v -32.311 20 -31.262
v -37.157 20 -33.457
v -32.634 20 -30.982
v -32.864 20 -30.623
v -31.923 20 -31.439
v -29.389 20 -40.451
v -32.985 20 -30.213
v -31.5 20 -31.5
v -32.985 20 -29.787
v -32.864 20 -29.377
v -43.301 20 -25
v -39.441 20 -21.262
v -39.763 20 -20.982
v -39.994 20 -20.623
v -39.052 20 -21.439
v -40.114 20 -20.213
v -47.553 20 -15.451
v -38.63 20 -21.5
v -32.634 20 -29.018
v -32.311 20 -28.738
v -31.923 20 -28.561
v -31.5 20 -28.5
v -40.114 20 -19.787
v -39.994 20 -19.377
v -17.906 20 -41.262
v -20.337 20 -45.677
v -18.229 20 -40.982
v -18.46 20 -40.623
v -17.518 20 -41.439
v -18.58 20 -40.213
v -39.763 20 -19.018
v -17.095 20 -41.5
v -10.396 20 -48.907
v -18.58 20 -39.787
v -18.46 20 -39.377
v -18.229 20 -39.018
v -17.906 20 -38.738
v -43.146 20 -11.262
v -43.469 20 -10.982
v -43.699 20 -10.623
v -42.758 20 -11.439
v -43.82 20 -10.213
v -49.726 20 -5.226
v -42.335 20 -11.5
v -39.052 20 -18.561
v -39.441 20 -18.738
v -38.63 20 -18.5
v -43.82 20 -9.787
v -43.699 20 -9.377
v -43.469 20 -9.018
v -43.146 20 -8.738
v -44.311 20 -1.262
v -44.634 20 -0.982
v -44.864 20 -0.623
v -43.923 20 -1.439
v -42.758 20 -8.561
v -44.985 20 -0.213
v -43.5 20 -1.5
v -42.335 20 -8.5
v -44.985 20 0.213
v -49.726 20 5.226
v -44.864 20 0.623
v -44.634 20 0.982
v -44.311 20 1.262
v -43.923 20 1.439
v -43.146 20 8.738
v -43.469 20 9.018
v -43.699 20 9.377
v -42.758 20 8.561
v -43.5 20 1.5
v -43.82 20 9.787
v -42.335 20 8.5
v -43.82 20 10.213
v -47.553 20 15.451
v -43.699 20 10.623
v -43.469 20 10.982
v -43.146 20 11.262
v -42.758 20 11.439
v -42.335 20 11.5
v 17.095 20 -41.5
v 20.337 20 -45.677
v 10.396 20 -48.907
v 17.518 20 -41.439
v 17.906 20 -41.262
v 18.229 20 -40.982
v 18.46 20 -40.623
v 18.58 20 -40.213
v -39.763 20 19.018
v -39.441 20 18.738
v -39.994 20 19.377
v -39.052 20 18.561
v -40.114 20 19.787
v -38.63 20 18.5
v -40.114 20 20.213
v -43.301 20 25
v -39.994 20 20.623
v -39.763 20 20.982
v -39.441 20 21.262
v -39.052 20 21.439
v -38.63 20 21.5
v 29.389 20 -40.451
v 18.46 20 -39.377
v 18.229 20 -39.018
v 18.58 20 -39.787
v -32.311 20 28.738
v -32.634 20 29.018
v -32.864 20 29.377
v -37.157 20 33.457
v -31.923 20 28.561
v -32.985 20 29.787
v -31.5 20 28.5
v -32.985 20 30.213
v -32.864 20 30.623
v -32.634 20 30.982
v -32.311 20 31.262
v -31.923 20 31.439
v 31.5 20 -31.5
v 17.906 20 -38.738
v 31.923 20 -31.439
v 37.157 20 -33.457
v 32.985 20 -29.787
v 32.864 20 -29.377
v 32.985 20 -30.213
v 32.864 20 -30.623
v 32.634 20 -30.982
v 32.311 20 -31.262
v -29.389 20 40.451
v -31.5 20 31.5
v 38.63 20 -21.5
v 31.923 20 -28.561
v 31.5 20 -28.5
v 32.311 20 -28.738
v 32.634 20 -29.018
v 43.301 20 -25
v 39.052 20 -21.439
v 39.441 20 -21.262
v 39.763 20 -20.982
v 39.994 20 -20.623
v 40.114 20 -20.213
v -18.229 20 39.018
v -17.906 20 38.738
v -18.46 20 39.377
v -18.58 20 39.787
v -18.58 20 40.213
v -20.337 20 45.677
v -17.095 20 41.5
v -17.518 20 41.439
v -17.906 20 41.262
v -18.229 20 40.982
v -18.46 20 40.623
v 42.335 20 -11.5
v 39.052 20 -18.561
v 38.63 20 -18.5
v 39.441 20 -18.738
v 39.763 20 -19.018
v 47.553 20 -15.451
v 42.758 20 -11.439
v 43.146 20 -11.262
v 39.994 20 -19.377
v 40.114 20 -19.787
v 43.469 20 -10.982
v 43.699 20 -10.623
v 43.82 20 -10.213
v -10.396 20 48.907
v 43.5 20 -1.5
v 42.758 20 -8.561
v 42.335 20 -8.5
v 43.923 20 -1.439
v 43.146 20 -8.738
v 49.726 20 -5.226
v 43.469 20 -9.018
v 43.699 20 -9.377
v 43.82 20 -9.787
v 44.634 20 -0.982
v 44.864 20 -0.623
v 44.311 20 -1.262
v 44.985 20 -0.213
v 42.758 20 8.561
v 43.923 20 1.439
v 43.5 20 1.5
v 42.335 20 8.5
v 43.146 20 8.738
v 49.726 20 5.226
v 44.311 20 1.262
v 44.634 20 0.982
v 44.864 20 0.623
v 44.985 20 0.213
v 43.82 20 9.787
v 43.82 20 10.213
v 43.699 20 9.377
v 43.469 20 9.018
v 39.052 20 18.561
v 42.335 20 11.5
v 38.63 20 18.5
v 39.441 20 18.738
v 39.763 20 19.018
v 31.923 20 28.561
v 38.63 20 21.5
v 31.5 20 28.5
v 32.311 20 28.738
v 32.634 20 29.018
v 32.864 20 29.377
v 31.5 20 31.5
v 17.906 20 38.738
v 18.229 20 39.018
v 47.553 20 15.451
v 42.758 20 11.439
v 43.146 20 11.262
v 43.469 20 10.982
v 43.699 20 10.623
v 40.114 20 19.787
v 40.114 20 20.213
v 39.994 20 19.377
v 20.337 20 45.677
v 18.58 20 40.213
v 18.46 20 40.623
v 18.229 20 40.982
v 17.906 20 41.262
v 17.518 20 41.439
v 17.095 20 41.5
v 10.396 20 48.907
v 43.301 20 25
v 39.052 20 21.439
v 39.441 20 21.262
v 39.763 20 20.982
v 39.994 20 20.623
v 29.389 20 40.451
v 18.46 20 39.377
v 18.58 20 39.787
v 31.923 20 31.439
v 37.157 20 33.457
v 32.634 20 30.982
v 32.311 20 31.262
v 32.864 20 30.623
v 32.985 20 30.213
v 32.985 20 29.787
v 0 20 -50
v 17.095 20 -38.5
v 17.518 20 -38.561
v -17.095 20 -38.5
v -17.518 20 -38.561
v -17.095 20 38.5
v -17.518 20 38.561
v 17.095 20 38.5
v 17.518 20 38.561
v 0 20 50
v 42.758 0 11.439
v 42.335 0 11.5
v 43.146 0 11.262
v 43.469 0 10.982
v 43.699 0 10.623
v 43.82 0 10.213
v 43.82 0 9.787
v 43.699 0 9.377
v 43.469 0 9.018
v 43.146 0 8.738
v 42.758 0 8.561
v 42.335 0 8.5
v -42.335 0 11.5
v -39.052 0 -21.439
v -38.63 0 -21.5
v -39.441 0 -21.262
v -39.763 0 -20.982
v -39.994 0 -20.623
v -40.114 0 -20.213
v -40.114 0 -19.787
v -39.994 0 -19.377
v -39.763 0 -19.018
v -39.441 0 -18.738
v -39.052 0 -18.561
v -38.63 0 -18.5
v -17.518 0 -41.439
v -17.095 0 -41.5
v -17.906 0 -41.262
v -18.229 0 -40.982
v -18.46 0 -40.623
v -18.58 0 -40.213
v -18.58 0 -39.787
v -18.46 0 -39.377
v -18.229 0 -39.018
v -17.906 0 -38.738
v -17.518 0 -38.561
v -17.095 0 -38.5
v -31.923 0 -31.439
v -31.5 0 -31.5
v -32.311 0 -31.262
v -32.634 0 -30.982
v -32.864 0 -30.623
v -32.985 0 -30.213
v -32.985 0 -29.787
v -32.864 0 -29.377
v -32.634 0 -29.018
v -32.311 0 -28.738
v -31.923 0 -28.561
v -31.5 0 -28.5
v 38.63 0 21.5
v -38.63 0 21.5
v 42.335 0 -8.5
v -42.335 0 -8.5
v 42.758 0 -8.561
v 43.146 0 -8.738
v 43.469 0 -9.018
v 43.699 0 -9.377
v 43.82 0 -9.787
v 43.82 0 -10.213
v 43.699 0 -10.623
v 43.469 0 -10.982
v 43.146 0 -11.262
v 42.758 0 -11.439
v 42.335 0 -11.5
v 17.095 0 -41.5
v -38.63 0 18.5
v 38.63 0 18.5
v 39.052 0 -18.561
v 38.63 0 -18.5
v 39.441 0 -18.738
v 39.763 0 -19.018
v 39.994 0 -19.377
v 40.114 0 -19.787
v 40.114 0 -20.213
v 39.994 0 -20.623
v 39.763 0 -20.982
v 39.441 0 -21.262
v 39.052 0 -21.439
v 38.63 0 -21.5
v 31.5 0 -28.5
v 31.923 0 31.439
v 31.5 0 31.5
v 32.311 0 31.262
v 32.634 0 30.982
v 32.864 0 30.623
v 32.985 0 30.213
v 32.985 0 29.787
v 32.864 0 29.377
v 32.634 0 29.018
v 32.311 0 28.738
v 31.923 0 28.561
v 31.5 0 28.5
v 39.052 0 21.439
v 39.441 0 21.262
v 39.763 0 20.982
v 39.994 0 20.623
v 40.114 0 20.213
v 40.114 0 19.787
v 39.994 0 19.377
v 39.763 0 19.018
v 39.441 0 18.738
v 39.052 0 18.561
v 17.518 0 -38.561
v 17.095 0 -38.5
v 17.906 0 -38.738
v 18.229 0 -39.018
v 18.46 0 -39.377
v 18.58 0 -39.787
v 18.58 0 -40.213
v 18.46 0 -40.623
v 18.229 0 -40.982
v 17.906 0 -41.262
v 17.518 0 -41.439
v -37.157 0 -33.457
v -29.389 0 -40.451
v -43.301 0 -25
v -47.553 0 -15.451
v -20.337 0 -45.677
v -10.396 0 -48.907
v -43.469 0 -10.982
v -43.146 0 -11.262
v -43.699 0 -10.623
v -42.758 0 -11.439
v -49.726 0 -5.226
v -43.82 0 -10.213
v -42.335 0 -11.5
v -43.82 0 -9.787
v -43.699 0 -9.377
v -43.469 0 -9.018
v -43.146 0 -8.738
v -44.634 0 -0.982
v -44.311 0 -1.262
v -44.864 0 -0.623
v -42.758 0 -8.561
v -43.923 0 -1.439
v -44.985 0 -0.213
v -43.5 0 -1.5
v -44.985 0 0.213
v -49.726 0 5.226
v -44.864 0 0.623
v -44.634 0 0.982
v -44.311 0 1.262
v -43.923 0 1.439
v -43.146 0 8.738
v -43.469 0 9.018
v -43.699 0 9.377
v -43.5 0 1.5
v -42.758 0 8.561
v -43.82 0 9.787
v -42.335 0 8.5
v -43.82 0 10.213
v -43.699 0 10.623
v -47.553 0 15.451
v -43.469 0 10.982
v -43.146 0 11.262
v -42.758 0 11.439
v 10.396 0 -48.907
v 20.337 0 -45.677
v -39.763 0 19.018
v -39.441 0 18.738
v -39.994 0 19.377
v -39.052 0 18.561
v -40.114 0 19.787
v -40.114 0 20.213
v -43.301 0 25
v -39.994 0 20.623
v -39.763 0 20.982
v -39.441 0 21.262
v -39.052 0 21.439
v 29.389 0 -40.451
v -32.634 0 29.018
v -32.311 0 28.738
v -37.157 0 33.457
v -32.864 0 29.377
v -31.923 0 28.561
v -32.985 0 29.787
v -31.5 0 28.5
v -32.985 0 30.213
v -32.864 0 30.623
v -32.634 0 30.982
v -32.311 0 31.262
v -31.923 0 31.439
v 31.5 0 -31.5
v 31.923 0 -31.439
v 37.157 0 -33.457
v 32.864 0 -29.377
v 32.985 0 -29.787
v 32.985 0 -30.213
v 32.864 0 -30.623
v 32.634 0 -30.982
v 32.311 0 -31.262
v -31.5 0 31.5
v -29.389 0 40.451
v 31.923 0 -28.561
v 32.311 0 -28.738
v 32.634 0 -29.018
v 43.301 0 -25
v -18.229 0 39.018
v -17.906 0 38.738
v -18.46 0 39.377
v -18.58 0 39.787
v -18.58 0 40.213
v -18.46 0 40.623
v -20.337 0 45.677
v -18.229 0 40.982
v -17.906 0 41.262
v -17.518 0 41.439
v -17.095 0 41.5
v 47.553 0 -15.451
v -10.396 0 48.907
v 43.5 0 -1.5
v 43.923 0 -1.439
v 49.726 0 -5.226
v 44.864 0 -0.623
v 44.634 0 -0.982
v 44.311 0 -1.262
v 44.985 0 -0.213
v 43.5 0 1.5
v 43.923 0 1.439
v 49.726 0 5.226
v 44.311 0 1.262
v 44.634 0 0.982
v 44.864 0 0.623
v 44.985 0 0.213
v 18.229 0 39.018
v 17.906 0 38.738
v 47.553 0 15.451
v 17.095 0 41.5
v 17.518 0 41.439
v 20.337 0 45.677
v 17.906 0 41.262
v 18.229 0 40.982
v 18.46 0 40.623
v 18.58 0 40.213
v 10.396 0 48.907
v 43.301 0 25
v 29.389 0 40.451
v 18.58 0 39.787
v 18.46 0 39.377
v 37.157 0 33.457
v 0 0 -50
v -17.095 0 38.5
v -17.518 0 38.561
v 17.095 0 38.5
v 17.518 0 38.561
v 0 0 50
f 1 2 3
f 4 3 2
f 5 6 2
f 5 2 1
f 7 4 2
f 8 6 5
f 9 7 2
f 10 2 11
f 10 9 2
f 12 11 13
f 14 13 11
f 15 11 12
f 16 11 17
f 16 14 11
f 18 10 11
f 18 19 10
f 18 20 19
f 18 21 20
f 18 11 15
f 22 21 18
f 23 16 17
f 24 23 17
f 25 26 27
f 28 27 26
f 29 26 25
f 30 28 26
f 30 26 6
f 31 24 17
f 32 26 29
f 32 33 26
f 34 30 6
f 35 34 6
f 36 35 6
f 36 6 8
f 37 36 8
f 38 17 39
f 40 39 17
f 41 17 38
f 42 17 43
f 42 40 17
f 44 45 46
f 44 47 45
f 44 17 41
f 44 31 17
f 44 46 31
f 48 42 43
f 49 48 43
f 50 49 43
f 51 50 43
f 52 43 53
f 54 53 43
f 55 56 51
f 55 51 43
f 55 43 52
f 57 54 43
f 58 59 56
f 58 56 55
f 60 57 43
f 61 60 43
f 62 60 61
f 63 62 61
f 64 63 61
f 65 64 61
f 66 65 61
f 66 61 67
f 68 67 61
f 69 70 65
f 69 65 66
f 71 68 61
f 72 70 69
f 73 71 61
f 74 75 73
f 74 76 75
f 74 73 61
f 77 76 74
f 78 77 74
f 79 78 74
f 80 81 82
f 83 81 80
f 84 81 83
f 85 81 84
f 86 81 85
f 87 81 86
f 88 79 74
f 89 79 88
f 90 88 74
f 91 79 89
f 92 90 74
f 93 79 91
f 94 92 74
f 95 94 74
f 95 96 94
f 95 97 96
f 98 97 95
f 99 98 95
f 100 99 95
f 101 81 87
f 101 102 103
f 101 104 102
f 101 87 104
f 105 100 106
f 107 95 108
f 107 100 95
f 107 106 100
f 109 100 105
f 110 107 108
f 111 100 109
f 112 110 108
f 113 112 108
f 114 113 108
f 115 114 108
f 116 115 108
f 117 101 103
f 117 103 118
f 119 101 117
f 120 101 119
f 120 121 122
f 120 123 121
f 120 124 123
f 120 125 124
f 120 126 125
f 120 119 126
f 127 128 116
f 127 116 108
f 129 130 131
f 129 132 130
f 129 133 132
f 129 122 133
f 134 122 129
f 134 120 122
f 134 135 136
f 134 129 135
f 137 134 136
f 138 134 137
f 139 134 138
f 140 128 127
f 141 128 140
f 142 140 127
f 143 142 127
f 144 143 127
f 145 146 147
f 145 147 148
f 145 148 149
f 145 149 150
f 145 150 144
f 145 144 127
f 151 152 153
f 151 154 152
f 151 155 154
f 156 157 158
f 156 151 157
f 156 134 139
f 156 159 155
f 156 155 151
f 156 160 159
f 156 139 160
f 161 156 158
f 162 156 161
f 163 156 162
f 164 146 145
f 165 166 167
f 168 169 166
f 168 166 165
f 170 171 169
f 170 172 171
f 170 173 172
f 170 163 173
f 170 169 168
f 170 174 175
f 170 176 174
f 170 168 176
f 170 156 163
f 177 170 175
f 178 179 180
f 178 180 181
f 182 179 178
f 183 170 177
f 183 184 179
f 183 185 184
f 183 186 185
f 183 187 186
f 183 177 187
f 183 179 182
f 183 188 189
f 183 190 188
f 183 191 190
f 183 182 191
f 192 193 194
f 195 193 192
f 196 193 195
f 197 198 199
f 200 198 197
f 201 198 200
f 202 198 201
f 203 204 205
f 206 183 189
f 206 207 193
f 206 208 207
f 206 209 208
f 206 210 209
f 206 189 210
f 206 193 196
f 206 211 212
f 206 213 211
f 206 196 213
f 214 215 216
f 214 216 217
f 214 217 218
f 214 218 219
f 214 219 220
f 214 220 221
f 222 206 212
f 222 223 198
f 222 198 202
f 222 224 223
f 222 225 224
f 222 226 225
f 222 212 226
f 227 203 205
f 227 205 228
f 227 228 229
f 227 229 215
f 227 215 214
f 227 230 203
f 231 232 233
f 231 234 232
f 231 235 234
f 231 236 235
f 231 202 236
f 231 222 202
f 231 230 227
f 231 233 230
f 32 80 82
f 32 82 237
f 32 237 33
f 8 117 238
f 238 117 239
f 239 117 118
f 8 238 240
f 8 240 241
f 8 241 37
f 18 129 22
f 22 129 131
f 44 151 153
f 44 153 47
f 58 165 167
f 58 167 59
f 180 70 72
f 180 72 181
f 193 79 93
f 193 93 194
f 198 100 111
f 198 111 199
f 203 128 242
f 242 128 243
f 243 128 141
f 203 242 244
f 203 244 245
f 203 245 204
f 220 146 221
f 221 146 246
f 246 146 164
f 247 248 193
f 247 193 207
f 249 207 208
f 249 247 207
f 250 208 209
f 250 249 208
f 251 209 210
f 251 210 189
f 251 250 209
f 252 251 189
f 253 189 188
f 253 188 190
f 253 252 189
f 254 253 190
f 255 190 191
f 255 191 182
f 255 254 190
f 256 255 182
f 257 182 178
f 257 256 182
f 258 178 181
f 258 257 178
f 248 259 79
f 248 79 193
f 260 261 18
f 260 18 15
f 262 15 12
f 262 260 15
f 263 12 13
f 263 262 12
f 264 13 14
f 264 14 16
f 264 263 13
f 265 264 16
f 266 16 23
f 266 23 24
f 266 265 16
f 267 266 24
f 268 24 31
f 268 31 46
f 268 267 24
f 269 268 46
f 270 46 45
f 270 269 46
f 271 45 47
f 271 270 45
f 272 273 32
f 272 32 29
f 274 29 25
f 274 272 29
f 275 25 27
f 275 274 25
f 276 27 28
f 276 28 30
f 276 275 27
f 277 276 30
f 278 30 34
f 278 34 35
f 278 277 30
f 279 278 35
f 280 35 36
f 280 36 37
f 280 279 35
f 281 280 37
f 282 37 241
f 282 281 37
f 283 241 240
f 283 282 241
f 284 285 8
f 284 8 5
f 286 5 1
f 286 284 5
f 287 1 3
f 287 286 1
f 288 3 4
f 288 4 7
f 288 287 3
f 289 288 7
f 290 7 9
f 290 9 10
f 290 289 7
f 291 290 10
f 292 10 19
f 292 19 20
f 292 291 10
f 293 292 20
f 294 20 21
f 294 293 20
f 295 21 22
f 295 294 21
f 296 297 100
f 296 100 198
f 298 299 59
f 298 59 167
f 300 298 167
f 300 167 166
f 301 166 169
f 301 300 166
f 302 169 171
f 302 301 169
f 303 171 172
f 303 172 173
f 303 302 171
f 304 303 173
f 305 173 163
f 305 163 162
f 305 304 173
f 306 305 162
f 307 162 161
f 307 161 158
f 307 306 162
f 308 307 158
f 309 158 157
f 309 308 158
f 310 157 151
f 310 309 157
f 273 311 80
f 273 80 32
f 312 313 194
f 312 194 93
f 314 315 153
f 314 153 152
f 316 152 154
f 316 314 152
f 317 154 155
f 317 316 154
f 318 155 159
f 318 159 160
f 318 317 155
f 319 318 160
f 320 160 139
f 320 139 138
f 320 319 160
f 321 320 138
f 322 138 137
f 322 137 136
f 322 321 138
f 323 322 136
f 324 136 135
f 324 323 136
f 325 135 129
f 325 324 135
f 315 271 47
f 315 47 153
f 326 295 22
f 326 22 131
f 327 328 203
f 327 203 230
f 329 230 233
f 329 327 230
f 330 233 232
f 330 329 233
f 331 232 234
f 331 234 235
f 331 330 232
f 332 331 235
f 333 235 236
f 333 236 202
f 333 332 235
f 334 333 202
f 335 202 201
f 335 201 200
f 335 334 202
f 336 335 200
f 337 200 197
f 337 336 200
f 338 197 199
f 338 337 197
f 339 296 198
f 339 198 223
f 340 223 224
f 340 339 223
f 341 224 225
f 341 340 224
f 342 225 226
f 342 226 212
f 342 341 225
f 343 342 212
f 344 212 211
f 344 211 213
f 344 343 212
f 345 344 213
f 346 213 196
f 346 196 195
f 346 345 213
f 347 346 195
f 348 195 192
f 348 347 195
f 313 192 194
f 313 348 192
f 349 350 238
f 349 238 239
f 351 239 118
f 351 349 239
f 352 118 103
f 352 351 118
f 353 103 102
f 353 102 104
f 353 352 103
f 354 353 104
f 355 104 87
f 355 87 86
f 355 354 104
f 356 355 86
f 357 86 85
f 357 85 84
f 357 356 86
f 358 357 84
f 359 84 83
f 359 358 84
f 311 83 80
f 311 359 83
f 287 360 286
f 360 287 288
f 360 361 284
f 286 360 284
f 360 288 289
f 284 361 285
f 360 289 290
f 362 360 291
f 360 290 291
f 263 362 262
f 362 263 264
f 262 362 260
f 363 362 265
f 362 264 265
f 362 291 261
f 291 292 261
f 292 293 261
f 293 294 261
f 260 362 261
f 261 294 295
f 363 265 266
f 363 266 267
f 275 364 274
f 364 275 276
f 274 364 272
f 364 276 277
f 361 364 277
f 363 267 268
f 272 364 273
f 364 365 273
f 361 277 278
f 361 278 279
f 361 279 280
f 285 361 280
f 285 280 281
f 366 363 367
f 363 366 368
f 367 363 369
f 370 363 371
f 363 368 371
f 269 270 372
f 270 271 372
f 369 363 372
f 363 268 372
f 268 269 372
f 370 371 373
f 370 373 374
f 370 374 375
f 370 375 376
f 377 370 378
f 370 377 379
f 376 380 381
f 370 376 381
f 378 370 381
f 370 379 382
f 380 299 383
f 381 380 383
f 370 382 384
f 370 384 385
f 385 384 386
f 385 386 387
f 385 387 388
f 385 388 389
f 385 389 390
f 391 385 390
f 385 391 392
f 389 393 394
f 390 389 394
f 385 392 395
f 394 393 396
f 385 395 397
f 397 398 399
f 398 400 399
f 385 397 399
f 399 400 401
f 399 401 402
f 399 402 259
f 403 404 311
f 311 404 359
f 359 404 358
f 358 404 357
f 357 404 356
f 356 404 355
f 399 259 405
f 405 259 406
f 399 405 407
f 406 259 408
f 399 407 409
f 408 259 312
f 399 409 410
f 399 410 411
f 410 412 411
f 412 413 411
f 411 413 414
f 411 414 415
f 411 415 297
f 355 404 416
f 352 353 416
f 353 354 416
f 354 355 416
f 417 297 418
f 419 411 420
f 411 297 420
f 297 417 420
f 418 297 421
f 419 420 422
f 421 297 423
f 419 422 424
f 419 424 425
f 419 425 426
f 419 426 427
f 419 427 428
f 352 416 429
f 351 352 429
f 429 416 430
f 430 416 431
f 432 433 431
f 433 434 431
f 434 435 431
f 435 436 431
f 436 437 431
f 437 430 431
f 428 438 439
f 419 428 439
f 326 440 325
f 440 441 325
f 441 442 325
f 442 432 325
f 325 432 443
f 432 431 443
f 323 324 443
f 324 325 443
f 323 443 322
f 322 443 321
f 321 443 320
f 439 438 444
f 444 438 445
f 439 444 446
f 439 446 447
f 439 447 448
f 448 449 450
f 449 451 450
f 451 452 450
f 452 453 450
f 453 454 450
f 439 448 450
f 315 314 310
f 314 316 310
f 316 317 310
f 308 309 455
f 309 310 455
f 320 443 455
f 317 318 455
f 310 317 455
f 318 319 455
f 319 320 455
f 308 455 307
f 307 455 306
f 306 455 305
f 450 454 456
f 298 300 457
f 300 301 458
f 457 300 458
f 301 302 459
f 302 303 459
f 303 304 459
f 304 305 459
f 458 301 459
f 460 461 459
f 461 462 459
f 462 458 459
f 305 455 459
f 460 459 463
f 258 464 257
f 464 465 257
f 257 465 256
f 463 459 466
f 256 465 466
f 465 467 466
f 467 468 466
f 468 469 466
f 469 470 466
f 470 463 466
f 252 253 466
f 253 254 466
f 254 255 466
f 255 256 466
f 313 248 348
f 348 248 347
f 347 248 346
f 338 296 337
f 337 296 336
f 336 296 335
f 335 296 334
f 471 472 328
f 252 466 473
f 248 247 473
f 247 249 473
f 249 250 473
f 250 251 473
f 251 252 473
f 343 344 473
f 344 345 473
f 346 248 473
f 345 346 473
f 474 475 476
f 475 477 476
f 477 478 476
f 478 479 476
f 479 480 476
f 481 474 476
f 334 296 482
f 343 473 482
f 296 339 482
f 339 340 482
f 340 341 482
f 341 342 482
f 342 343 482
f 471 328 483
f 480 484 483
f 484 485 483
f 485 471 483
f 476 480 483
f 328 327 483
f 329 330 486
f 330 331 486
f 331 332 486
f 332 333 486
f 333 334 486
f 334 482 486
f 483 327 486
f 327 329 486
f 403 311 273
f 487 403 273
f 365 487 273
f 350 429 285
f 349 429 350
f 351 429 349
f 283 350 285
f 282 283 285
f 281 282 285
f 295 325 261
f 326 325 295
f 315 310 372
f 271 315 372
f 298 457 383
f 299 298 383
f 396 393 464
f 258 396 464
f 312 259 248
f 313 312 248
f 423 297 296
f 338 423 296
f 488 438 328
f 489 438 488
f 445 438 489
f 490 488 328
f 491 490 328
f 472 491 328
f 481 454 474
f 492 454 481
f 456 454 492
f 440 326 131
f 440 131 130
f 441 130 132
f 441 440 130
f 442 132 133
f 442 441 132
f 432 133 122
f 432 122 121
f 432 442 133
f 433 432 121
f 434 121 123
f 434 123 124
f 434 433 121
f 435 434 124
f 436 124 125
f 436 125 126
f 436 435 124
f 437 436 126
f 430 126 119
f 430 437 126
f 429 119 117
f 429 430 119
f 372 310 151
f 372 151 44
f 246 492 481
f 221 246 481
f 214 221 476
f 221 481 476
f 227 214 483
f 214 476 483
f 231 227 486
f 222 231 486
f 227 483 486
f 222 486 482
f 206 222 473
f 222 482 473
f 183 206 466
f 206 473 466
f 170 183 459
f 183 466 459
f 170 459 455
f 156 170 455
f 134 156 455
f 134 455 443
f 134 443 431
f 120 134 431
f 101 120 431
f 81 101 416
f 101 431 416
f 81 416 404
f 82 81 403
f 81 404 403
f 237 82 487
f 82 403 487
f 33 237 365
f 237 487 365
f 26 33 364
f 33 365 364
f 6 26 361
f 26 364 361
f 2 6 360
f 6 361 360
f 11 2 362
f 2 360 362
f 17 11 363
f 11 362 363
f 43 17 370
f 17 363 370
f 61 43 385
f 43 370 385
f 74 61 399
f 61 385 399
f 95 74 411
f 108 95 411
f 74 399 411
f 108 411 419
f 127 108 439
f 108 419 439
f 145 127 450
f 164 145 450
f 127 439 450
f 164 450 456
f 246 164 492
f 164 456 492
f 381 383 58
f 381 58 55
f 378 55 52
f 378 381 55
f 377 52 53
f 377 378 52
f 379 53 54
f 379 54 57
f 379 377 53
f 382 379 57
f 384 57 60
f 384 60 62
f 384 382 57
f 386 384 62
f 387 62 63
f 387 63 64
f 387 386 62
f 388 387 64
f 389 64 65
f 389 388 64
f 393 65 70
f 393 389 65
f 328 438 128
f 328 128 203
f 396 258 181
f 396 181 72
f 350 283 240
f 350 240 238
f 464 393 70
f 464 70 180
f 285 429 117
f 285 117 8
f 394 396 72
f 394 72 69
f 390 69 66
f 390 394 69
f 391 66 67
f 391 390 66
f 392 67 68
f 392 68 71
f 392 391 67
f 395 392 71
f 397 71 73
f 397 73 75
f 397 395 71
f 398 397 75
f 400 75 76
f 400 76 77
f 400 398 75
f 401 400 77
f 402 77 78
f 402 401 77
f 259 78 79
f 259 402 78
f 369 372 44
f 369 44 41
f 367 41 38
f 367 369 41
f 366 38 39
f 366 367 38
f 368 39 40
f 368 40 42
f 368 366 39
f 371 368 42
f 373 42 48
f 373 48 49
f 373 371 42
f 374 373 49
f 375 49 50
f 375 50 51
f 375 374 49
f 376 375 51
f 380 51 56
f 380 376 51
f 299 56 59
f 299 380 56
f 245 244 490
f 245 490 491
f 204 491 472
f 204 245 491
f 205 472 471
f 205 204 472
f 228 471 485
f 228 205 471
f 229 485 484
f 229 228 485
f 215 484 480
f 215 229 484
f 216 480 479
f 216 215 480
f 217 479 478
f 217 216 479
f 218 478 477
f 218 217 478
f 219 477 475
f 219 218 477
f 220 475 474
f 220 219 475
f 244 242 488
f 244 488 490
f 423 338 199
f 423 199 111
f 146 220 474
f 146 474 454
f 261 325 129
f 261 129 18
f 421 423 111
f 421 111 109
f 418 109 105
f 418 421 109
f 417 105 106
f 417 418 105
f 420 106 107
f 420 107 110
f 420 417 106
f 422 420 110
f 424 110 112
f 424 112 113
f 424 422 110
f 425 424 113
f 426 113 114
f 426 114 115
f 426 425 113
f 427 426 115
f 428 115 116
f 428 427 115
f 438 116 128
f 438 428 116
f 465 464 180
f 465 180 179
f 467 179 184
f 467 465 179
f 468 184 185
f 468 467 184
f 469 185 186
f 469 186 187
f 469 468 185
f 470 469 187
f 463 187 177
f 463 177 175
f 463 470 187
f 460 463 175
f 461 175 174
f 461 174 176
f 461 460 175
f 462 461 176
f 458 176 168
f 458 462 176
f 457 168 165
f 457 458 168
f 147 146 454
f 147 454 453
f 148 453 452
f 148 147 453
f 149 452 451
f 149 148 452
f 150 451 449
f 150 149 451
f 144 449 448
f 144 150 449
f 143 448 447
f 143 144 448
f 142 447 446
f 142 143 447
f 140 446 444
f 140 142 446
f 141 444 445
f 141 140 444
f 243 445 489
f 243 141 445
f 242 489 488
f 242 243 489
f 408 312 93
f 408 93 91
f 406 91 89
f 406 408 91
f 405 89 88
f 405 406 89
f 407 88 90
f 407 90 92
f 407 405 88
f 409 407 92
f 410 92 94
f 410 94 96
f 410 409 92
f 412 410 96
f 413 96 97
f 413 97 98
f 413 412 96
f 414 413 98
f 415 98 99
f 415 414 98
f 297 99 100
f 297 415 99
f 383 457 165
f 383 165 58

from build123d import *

# Parameters (mm, degrees)
SKETCH_3_R             = 50
EXTRUDE_2_DEPTH        = 20
CUT_EXTRUDE_2_DEPTH    = 74.484692283
PATTERN_LINEAR_2_DEPTH = 20


# Read off the part's stored shape, not the designer's step: 阵列(线性)2
with BuildPart() as part:
    # 草图3 → 凸台-拉伸2 (new body)
    with BuildSketch(Plane(origin=(0, 0, 0), x_dir=(1, 0, 0), z_dir=(0, 1, 0))):
        with Locations(Location((0, 0, 0), (0, 0, 270))):
            Circle(SKETCH_3_R)
    extrude(amount=EXTRUDE_2_DEPTH)

    # 草图4 → 切除-拉伸2 (cut, through all)
    with BuildSketch(Plane(origin=(0, 20, 0), x_dir=(1, 0, 0), z_dir=(0, 1, 0))):
        with BuildLine():
            Line((-17.095320997, -38.5), (17.095320997, -38.5))
            ThreePointArc((17.095320997, -38.5), (18.595320997, -40), (17.095320997, -41.5))
            Line((17.095320997, -41.5), (-17.095320997, -41.5))
            ThreePointArc((-17.095320997, -41.5), (-18.595320997, -40), (-17.095320997, -38.5))
        make_face()
    extrude(amount=-CUT_EXTRUDE_2_DEPTH, mode=Mode.SUBTRACT)

    # 阵列(线性)2 outline → 阵列(线性)2 (cut)
    with BuildSketch(Plane(origin=(0, 0, 0), x_dir=(1, 0, 0), z_dir=(0, 1, 0))):
        with BuildLine():
            Line((17.095320997, 41.5), (-17.095320997, 41.5))
            ThreePointArc((-17.095320997, 41.5), (-18.595320997, 40), (-17.095320997, 38.5))
            Line((-17.095320997, 38.5), (17.095320997, 38.5))
            ThreePointArc((17.095320997, 38.5), (18.595320997, 40), (17.095320997, 41.5))
        make_face()
        with BuildLine():
            Line((31.5, 31.5), (-31.5, 31.5))
            ThreePointArc((-31.5, 31.5), (-33, 30), (-31.5, 28.5))
            Line((-31.5, 28.5), (31.5, 28.5))
            ThreePointArc((31.5, 28.5), (33, 30), (31.5, 31.5))
        make_face()
        with BuildLine():
            Line((38.629651823, 21.5), (-38.629651823, 21.5))
            ThreePointArc((-38.629651823, 21.5), (-40.129651823, 20), (-38.629651823, 18.5))
            Line((-38.629651823, 18.5), (38.629651823, 18.5))
            ThreePointArc((38.629651823, 18.5), (40.129651823, 20), (38.629651823, 21.5))
        make_face()
        with BuildLine():
            Line((42.334973721, 11.5), (-42.334973721, 11.5))
            ThreePointArc((-42.334973721, 11.5), (-43.834973721, 10), (-42.334973721, 8.5))
            Line((-42.334973721, 8.5), (42.334973721, 8.5))
            ThreePointArc((42.334973721, 8.5), (43.834973721, 10), (42.334973721, 11.5))
        make_face()
        with BuildLine():
            Line((43.5, 1.5), (-43.5, 1.5))
            ThreePointArc((-43.5, 1.5), (-45, 0), (-43.5, -1.5))
            Line((-43.5, -1.5), (43.5, -1.5))
            ThreePointArc((43.5, -1.5), (45, 0), (43.5, 1.5))
        make_face()
        with BuildLine():
            Line((42.334973721, -8.5), (-42.334973721, -8.5))
            ThreePointArc((-42.334973721, -8.5), (-43.834973721, -10), (-42.334973721, -11.5))
            Line((-42.334973721, -11.5), (42.334973721, -11.5))
            ThreePointArc((42.334973721, -11.5), (43.834973721, -10), (42.334973721, -8.5))
        make_face()
        with BuildLine():
            Line((38.629651823, -18.5), (-38.629651823, -18.5))
            ThreePointArc((-38.629651823, -18.5), (-40.129651823, -20), (-38.629651823, -21.5))
            Line((-38.629651823, -21.5), (38.629651823, -21.5))
            ThreePointArc((38.629651823, -21.5), (40.129651823, -20), (38.629651823, -18.5))
        make_face()
        with BuildLine():
            Line((31.5, -28.5), (-31.5, -28.5))
            ThreePointArc((-31.5, -28.5), (-33, -30), (-31.5, -31.5))
            Line((-31.5, -31.5), (31.5, -31.5))
            ThreePointArc((31.5, -31.5), (33, -30), (31.5, -28.5))
        make_face()
    extrude(amount=PATTERN_LINEAR_2_DEPTH, mode=Mode.SUBTRACT)


solid = part.part
